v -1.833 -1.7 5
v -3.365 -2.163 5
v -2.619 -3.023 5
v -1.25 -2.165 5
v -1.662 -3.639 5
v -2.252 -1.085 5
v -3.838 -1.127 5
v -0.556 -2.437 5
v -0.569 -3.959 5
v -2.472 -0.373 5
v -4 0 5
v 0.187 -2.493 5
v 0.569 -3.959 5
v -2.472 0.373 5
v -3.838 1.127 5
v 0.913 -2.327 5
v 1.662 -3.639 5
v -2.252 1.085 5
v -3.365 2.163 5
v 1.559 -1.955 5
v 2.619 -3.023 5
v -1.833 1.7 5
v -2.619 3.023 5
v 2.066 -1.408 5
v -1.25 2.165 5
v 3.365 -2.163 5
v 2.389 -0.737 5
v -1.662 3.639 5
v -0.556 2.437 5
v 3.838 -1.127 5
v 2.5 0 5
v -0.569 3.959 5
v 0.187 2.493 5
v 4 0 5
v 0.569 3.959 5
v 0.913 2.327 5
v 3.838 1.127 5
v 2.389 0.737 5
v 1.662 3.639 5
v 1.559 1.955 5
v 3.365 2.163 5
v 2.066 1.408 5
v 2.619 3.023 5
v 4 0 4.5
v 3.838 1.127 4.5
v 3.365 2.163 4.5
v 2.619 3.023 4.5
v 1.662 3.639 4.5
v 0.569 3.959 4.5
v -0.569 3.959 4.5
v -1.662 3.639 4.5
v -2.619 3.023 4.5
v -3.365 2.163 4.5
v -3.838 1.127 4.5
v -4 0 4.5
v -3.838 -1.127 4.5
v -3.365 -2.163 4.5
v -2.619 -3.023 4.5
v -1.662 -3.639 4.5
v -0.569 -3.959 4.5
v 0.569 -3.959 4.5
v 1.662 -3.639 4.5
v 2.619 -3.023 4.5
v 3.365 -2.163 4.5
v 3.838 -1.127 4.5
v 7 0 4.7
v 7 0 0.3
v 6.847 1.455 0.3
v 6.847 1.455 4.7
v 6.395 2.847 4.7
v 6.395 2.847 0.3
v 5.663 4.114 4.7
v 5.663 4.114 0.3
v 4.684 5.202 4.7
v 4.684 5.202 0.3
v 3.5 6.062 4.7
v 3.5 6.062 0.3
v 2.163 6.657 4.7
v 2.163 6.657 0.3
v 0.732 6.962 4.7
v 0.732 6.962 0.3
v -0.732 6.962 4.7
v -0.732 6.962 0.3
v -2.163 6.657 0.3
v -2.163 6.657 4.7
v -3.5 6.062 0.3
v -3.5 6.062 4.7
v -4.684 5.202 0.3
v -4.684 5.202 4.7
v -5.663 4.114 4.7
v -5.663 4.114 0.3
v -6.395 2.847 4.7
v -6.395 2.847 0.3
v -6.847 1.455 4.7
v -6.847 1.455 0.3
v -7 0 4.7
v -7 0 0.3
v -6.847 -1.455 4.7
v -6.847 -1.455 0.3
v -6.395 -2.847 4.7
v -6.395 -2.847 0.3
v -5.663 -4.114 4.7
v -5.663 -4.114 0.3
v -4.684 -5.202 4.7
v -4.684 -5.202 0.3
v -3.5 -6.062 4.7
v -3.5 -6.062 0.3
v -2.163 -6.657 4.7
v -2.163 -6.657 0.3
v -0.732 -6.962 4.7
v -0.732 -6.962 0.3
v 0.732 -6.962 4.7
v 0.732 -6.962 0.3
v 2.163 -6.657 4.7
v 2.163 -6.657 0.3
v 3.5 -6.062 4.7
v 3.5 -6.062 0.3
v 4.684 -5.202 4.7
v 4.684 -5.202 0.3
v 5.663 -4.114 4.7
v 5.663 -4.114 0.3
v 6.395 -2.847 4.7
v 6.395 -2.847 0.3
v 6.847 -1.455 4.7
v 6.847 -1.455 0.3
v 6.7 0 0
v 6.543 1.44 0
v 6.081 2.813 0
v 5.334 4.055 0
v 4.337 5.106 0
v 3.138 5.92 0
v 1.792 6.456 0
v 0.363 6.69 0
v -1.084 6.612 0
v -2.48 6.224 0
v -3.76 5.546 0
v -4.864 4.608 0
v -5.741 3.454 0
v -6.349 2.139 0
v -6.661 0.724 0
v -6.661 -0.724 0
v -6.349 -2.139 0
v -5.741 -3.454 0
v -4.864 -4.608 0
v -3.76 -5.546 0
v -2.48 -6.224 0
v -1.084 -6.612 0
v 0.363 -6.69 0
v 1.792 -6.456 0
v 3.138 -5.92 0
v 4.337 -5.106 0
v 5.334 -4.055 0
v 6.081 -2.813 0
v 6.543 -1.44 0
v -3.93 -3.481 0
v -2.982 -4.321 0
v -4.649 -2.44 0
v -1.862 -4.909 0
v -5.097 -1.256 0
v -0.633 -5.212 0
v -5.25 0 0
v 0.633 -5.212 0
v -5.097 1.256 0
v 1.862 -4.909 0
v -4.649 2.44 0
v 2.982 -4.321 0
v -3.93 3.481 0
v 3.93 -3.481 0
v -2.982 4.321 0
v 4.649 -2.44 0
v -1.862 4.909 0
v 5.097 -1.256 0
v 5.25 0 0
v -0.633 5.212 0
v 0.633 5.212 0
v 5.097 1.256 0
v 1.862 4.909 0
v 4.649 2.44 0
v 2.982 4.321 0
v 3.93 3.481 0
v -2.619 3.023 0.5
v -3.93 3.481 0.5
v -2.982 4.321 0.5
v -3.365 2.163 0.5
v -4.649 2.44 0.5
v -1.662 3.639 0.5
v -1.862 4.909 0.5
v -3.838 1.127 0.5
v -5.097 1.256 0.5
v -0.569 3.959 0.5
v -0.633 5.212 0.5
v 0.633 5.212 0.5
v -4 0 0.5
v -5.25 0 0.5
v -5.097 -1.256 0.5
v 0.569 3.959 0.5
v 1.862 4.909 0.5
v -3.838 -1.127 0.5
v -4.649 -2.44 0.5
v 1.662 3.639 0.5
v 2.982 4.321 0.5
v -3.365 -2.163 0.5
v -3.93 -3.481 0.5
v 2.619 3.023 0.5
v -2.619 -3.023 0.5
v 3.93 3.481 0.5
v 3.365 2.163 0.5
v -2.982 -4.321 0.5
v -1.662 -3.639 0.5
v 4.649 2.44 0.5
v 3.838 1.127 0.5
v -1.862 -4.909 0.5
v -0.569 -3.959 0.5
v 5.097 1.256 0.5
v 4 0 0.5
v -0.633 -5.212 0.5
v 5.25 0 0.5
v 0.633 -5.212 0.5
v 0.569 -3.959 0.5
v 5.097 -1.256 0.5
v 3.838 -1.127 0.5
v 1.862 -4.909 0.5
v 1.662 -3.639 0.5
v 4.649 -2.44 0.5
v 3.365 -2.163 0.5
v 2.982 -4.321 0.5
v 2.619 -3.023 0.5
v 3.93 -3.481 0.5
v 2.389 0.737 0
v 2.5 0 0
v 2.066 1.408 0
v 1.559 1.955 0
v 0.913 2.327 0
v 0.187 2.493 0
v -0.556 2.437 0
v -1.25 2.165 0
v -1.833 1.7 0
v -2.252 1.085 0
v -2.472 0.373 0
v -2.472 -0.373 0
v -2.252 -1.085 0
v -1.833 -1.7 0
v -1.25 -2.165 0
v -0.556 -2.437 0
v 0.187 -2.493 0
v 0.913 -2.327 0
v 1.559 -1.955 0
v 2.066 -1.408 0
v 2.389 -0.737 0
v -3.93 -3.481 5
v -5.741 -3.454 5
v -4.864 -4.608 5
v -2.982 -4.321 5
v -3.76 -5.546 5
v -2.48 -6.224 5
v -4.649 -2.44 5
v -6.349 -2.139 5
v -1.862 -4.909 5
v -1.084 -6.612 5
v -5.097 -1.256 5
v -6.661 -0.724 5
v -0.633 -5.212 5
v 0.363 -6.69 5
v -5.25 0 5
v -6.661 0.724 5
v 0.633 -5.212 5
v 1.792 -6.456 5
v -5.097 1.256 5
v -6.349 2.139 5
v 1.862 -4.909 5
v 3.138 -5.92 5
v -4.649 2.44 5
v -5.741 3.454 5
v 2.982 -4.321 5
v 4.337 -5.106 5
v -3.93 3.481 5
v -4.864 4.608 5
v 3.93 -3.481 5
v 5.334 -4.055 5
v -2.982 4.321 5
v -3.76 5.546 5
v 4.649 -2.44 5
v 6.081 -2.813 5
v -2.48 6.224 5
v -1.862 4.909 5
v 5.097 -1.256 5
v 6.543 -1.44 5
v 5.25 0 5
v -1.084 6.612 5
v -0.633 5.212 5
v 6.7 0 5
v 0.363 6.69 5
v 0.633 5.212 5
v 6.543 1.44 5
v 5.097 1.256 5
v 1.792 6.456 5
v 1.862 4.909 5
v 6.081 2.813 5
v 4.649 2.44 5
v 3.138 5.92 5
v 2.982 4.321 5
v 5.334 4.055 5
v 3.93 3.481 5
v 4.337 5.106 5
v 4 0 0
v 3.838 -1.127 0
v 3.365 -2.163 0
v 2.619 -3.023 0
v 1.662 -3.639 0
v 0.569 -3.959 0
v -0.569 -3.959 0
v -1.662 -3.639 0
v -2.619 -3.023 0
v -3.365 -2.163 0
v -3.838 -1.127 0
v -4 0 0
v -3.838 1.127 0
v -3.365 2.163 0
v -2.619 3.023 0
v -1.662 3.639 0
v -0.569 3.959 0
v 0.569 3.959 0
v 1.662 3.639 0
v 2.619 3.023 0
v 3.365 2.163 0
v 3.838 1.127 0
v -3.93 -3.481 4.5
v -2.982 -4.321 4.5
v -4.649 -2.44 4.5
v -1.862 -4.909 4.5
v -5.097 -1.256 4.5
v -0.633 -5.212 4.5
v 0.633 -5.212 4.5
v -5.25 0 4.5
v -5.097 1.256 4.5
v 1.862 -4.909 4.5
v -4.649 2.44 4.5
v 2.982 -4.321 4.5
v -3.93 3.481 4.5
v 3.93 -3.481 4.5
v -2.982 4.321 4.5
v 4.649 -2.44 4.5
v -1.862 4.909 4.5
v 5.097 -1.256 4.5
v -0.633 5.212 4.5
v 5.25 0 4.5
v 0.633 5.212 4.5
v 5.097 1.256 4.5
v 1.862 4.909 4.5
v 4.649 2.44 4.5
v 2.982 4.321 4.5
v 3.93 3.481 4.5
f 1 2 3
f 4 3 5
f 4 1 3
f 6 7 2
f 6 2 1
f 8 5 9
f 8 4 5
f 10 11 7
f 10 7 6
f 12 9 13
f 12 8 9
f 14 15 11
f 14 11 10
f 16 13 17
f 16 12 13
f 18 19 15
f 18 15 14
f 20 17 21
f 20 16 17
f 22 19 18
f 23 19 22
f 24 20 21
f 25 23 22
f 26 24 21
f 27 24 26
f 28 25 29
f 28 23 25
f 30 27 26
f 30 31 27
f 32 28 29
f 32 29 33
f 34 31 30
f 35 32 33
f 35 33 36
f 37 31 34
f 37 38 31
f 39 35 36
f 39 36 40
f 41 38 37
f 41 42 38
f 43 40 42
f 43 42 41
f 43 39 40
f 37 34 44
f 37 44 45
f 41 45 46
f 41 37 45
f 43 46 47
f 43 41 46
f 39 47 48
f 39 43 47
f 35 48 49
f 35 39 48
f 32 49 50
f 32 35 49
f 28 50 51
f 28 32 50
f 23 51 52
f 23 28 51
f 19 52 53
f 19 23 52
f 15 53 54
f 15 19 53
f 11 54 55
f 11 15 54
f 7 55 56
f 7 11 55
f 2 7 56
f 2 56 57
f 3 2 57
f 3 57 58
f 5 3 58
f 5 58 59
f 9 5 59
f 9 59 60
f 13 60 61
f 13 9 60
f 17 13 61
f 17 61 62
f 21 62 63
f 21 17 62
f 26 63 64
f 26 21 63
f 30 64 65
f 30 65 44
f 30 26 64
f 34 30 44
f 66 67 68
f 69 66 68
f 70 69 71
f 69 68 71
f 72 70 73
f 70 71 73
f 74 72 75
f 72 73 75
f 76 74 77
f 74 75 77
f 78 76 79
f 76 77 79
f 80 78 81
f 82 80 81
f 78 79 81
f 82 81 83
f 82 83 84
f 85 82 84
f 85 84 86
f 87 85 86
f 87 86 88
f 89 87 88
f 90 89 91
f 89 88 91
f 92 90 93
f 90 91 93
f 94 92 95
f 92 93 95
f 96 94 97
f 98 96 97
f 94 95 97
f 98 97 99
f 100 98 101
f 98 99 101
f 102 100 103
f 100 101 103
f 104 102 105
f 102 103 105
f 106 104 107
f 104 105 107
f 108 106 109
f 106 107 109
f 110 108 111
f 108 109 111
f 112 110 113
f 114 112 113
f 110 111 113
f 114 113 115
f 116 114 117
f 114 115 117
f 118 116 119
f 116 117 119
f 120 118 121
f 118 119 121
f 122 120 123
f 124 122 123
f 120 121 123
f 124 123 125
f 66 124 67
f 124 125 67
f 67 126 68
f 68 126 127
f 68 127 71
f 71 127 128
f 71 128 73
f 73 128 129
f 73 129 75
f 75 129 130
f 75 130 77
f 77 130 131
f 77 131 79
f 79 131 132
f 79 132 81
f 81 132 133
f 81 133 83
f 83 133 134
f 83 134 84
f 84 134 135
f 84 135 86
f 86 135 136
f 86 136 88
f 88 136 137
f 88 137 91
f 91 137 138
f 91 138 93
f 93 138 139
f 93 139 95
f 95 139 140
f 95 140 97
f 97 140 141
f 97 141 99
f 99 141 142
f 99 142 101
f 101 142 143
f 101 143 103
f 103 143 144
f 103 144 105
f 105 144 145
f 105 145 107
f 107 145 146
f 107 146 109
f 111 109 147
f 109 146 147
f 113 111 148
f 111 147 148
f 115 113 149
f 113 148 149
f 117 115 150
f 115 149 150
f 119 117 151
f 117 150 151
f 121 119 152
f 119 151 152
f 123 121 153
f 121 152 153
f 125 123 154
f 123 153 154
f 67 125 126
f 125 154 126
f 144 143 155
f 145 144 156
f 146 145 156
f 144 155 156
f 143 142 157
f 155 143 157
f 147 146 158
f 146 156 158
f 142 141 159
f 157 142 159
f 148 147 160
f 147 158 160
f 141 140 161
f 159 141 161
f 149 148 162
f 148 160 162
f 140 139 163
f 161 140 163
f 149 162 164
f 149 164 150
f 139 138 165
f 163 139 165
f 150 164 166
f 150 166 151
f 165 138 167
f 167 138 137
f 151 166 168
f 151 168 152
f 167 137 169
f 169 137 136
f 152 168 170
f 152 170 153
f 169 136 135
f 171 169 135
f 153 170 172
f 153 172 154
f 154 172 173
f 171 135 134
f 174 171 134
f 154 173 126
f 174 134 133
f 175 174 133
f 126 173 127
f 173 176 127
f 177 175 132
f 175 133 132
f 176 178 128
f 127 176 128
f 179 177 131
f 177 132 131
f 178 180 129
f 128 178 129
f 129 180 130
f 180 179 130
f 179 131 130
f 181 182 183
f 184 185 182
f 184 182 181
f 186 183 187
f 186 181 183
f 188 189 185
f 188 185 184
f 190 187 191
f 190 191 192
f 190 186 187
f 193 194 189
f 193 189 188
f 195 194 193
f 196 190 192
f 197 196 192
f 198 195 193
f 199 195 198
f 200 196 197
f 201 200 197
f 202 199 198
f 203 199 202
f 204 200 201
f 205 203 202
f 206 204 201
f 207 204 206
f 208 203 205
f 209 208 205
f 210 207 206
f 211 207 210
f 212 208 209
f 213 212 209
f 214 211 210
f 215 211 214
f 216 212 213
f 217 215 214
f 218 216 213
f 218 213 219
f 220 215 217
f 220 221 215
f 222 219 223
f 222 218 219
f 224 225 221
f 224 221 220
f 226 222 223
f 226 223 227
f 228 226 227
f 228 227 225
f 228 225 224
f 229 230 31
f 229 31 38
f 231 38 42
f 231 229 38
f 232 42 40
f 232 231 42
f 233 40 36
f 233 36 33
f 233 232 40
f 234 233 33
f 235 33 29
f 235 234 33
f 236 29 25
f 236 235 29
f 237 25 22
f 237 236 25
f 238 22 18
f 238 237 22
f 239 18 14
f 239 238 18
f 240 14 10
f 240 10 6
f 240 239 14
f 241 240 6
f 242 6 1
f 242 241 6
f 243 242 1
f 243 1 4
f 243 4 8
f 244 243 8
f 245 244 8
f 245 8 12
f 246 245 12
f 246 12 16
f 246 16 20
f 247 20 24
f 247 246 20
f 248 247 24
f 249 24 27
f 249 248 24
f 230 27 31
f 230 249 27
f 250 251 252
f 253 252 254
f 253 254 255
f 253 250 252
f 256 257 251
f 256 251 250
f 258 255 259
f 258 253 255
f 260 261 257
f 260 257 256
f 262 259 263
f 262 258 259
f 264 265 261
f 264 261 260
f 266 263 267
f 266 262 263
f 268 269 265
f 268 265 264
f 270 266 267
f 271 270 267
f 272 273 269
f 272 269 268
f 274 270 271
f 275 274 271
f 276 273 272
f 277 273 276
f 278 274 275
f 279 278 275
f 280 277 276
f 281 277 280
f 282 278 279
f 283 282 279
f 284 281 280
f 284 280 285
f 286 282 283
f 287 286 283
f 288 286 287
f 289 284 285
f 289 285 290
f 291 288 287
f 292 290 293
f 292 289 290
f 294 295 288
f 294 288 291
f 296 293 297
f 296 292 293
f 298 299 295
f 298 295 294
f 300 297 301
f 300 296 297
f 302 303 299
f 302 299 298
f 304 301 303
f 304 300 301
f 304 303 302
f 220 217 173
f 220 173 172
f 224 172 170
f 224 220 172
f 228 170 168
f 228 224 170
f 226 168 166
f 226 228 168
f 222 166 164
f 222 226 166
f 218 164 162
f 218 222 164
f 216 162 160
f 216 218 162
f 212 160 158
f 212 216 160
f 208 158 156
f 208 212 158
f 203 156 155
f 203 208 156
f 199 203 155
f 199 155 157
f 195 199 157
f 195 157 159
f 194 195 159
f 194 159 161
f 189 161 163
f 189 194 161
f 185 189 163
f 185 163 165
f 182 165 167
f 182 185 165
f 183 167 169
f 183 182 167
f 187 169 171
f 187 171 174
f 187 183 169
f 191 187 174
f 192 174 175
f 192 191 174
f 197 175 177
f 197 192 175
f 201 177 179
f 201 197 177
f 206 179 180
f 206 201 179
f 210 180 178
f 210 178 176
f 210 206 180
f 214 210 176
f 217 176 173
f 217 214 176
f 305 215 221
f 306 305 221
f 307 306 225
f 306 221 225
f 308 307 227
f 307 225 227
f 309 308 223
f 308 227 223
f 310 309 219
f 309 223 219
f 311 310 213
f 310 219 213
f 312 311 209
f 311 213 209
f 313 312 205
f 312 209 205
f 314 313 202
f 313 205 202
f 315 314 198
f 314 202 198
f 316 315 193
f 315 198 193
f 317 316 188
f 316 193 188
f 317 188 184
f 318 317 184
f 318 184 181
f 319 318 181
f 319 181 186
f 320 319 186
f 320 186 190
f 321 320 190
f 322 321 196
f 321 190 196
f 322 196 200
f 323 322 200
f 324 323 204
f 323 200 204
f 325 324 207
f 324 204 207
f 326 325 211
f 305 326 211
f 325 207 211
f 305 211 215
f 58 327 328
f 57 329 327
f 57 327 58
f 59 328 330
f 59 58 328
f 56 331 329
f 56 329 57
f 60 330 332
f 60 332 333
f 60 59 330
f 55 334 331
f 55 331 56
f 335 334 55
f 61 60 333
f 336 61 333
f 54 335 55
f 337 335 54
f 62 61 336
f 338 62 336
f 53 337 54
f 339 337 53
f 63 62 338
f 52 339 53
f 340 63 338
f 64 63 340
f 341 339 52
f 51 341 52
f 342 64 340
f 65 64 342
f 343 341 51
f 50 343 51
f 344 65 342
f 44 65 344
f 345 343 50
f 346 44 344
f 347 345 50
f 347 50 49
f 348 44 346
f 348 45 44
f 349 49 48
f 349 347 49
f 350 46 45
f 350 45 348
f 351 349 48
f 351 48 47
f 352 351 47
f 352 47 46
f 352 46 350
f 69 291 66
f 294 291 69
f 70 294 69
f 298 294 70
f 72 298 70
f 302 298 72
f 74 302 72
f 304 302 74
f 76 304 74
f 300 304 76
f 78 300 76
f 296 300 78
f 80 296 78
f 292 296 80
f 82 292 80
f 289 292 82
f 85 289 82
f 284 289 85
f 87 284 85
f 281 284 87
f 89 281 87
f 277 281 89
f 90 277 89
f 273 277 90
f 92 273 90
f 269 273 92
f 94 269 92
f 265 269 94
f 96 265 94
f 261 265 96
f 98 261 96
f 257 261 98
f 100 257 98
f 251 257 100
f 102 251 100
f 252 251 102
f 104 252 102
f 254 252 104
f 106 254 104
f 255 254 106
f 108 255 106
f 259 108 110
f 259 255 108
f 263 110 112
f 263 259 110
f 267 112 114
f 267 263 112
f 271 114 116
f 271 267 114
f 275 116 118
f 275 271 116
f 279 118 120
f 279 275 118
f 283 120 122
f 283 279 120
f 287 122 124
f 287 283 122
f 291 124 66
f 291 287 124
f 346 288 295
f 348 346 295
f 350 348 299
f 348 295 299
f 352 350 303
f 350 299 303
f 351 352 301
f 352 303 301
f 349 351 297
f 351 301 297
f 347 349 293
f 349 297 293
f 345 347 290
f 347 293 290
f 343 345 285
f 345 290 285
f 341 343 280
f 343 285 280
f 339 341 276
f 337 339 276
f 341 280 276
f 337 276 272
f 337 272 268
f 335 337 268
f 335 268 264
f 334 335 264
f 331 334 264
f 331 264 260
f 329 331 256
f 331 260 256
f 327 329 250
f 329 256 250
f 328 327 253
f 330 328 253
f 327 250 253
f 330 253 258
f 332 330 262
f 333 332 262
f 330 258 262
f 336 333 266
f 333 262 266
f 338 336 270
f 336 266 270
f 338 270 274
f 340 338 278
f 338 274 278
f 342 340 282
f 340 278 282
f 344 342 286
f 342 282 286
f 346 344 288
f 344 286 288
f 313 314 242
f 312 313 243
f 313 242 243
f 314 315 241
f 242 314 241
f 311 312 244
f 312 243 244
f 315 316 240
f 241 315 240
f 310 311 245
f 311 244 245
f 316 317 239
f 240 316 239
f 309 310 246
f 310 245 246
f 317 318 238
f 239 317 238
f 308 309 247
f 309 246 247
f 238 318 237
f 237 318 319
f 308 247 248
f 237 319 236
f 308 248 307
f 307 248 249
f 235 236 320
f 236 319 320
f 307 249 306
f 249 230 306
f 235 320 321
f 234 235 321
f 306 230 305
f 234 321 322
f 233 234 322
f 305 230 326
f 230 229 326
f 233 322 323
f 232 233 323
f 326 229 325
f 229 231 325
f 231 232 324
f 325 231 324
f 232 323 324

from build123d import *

# Parameters (mm, degrees)
SKETCH1_R           = 7
SKETCH1_R_2         = 2.5
BOSS_EXTRUDE1_DEPTH = 5
SKETCH2_R           = 5.25
SKETCH2_R_2         = 4
CUT_EXTRUDE1_DEPTH  = 0.5
CUT_EXTRUDE2_START  = -0.5
SKETCH3_R           = 5.25
SKETCH3_R_2         = 4
CUT_EXTRUDE2_DEPTH  = 0.5
CHAMFER1_SIZE       = 0.3


with BuildPart() as part:
    # Sketch1 → Boss-Extrude1 (new body)
    with BuildSketch(Plane.XY):
        Circle(SKETCH1_R)
        Circle(SKETCH1_R_2, mode=Mode.SUBTRACT)
    extrude(amount=BOSS_EXTRUDE1_DEPTH)

    # Sketch2 → Cut-Extrude1 (cut)
    with BuildSketch(Plane.XY.offset(5)):
        Circle(SKETCH2_R)
        Circle(SKETCH2_R_2, mode=Mode.SUBTRACT)
    extrude(amount=-CUT_EXTRUDE1_DEPTH, mode=Mode.SUBTRACT)

    # Sketch3 → Cut-Extrude2 (cut)
    with BuildSketch(Plane(origin=(0, 0, 0), x_dir=(-1, 0, 0), z_dir=(0, 0, -1)).offset(CUT_EXTRUDE2_START)):
        with Locations(Location((0, 0, 0), (0, 0, 180))):
            Circle(SKETCH3_R)
        with Locations(Location((0, 0, 0), (0, 0, 180))):
            Circle(SKETCH3_R_2, mode=Mode.SUBTRACT)
    extrude(amount=CUT_EXTRUDE2_DEPTH, mode=Mode.SUBTRACT)

    # Chamfer1
    chamfer1_edges = [part.edges().sort_by_distance(p)[0] for p in [
        (-7, 0, 0),
        (-7, 0, 5),
    ]]
    chamfer(chamfer1_edges, length=CHAMFER1_SIZE)


solid = part.part
